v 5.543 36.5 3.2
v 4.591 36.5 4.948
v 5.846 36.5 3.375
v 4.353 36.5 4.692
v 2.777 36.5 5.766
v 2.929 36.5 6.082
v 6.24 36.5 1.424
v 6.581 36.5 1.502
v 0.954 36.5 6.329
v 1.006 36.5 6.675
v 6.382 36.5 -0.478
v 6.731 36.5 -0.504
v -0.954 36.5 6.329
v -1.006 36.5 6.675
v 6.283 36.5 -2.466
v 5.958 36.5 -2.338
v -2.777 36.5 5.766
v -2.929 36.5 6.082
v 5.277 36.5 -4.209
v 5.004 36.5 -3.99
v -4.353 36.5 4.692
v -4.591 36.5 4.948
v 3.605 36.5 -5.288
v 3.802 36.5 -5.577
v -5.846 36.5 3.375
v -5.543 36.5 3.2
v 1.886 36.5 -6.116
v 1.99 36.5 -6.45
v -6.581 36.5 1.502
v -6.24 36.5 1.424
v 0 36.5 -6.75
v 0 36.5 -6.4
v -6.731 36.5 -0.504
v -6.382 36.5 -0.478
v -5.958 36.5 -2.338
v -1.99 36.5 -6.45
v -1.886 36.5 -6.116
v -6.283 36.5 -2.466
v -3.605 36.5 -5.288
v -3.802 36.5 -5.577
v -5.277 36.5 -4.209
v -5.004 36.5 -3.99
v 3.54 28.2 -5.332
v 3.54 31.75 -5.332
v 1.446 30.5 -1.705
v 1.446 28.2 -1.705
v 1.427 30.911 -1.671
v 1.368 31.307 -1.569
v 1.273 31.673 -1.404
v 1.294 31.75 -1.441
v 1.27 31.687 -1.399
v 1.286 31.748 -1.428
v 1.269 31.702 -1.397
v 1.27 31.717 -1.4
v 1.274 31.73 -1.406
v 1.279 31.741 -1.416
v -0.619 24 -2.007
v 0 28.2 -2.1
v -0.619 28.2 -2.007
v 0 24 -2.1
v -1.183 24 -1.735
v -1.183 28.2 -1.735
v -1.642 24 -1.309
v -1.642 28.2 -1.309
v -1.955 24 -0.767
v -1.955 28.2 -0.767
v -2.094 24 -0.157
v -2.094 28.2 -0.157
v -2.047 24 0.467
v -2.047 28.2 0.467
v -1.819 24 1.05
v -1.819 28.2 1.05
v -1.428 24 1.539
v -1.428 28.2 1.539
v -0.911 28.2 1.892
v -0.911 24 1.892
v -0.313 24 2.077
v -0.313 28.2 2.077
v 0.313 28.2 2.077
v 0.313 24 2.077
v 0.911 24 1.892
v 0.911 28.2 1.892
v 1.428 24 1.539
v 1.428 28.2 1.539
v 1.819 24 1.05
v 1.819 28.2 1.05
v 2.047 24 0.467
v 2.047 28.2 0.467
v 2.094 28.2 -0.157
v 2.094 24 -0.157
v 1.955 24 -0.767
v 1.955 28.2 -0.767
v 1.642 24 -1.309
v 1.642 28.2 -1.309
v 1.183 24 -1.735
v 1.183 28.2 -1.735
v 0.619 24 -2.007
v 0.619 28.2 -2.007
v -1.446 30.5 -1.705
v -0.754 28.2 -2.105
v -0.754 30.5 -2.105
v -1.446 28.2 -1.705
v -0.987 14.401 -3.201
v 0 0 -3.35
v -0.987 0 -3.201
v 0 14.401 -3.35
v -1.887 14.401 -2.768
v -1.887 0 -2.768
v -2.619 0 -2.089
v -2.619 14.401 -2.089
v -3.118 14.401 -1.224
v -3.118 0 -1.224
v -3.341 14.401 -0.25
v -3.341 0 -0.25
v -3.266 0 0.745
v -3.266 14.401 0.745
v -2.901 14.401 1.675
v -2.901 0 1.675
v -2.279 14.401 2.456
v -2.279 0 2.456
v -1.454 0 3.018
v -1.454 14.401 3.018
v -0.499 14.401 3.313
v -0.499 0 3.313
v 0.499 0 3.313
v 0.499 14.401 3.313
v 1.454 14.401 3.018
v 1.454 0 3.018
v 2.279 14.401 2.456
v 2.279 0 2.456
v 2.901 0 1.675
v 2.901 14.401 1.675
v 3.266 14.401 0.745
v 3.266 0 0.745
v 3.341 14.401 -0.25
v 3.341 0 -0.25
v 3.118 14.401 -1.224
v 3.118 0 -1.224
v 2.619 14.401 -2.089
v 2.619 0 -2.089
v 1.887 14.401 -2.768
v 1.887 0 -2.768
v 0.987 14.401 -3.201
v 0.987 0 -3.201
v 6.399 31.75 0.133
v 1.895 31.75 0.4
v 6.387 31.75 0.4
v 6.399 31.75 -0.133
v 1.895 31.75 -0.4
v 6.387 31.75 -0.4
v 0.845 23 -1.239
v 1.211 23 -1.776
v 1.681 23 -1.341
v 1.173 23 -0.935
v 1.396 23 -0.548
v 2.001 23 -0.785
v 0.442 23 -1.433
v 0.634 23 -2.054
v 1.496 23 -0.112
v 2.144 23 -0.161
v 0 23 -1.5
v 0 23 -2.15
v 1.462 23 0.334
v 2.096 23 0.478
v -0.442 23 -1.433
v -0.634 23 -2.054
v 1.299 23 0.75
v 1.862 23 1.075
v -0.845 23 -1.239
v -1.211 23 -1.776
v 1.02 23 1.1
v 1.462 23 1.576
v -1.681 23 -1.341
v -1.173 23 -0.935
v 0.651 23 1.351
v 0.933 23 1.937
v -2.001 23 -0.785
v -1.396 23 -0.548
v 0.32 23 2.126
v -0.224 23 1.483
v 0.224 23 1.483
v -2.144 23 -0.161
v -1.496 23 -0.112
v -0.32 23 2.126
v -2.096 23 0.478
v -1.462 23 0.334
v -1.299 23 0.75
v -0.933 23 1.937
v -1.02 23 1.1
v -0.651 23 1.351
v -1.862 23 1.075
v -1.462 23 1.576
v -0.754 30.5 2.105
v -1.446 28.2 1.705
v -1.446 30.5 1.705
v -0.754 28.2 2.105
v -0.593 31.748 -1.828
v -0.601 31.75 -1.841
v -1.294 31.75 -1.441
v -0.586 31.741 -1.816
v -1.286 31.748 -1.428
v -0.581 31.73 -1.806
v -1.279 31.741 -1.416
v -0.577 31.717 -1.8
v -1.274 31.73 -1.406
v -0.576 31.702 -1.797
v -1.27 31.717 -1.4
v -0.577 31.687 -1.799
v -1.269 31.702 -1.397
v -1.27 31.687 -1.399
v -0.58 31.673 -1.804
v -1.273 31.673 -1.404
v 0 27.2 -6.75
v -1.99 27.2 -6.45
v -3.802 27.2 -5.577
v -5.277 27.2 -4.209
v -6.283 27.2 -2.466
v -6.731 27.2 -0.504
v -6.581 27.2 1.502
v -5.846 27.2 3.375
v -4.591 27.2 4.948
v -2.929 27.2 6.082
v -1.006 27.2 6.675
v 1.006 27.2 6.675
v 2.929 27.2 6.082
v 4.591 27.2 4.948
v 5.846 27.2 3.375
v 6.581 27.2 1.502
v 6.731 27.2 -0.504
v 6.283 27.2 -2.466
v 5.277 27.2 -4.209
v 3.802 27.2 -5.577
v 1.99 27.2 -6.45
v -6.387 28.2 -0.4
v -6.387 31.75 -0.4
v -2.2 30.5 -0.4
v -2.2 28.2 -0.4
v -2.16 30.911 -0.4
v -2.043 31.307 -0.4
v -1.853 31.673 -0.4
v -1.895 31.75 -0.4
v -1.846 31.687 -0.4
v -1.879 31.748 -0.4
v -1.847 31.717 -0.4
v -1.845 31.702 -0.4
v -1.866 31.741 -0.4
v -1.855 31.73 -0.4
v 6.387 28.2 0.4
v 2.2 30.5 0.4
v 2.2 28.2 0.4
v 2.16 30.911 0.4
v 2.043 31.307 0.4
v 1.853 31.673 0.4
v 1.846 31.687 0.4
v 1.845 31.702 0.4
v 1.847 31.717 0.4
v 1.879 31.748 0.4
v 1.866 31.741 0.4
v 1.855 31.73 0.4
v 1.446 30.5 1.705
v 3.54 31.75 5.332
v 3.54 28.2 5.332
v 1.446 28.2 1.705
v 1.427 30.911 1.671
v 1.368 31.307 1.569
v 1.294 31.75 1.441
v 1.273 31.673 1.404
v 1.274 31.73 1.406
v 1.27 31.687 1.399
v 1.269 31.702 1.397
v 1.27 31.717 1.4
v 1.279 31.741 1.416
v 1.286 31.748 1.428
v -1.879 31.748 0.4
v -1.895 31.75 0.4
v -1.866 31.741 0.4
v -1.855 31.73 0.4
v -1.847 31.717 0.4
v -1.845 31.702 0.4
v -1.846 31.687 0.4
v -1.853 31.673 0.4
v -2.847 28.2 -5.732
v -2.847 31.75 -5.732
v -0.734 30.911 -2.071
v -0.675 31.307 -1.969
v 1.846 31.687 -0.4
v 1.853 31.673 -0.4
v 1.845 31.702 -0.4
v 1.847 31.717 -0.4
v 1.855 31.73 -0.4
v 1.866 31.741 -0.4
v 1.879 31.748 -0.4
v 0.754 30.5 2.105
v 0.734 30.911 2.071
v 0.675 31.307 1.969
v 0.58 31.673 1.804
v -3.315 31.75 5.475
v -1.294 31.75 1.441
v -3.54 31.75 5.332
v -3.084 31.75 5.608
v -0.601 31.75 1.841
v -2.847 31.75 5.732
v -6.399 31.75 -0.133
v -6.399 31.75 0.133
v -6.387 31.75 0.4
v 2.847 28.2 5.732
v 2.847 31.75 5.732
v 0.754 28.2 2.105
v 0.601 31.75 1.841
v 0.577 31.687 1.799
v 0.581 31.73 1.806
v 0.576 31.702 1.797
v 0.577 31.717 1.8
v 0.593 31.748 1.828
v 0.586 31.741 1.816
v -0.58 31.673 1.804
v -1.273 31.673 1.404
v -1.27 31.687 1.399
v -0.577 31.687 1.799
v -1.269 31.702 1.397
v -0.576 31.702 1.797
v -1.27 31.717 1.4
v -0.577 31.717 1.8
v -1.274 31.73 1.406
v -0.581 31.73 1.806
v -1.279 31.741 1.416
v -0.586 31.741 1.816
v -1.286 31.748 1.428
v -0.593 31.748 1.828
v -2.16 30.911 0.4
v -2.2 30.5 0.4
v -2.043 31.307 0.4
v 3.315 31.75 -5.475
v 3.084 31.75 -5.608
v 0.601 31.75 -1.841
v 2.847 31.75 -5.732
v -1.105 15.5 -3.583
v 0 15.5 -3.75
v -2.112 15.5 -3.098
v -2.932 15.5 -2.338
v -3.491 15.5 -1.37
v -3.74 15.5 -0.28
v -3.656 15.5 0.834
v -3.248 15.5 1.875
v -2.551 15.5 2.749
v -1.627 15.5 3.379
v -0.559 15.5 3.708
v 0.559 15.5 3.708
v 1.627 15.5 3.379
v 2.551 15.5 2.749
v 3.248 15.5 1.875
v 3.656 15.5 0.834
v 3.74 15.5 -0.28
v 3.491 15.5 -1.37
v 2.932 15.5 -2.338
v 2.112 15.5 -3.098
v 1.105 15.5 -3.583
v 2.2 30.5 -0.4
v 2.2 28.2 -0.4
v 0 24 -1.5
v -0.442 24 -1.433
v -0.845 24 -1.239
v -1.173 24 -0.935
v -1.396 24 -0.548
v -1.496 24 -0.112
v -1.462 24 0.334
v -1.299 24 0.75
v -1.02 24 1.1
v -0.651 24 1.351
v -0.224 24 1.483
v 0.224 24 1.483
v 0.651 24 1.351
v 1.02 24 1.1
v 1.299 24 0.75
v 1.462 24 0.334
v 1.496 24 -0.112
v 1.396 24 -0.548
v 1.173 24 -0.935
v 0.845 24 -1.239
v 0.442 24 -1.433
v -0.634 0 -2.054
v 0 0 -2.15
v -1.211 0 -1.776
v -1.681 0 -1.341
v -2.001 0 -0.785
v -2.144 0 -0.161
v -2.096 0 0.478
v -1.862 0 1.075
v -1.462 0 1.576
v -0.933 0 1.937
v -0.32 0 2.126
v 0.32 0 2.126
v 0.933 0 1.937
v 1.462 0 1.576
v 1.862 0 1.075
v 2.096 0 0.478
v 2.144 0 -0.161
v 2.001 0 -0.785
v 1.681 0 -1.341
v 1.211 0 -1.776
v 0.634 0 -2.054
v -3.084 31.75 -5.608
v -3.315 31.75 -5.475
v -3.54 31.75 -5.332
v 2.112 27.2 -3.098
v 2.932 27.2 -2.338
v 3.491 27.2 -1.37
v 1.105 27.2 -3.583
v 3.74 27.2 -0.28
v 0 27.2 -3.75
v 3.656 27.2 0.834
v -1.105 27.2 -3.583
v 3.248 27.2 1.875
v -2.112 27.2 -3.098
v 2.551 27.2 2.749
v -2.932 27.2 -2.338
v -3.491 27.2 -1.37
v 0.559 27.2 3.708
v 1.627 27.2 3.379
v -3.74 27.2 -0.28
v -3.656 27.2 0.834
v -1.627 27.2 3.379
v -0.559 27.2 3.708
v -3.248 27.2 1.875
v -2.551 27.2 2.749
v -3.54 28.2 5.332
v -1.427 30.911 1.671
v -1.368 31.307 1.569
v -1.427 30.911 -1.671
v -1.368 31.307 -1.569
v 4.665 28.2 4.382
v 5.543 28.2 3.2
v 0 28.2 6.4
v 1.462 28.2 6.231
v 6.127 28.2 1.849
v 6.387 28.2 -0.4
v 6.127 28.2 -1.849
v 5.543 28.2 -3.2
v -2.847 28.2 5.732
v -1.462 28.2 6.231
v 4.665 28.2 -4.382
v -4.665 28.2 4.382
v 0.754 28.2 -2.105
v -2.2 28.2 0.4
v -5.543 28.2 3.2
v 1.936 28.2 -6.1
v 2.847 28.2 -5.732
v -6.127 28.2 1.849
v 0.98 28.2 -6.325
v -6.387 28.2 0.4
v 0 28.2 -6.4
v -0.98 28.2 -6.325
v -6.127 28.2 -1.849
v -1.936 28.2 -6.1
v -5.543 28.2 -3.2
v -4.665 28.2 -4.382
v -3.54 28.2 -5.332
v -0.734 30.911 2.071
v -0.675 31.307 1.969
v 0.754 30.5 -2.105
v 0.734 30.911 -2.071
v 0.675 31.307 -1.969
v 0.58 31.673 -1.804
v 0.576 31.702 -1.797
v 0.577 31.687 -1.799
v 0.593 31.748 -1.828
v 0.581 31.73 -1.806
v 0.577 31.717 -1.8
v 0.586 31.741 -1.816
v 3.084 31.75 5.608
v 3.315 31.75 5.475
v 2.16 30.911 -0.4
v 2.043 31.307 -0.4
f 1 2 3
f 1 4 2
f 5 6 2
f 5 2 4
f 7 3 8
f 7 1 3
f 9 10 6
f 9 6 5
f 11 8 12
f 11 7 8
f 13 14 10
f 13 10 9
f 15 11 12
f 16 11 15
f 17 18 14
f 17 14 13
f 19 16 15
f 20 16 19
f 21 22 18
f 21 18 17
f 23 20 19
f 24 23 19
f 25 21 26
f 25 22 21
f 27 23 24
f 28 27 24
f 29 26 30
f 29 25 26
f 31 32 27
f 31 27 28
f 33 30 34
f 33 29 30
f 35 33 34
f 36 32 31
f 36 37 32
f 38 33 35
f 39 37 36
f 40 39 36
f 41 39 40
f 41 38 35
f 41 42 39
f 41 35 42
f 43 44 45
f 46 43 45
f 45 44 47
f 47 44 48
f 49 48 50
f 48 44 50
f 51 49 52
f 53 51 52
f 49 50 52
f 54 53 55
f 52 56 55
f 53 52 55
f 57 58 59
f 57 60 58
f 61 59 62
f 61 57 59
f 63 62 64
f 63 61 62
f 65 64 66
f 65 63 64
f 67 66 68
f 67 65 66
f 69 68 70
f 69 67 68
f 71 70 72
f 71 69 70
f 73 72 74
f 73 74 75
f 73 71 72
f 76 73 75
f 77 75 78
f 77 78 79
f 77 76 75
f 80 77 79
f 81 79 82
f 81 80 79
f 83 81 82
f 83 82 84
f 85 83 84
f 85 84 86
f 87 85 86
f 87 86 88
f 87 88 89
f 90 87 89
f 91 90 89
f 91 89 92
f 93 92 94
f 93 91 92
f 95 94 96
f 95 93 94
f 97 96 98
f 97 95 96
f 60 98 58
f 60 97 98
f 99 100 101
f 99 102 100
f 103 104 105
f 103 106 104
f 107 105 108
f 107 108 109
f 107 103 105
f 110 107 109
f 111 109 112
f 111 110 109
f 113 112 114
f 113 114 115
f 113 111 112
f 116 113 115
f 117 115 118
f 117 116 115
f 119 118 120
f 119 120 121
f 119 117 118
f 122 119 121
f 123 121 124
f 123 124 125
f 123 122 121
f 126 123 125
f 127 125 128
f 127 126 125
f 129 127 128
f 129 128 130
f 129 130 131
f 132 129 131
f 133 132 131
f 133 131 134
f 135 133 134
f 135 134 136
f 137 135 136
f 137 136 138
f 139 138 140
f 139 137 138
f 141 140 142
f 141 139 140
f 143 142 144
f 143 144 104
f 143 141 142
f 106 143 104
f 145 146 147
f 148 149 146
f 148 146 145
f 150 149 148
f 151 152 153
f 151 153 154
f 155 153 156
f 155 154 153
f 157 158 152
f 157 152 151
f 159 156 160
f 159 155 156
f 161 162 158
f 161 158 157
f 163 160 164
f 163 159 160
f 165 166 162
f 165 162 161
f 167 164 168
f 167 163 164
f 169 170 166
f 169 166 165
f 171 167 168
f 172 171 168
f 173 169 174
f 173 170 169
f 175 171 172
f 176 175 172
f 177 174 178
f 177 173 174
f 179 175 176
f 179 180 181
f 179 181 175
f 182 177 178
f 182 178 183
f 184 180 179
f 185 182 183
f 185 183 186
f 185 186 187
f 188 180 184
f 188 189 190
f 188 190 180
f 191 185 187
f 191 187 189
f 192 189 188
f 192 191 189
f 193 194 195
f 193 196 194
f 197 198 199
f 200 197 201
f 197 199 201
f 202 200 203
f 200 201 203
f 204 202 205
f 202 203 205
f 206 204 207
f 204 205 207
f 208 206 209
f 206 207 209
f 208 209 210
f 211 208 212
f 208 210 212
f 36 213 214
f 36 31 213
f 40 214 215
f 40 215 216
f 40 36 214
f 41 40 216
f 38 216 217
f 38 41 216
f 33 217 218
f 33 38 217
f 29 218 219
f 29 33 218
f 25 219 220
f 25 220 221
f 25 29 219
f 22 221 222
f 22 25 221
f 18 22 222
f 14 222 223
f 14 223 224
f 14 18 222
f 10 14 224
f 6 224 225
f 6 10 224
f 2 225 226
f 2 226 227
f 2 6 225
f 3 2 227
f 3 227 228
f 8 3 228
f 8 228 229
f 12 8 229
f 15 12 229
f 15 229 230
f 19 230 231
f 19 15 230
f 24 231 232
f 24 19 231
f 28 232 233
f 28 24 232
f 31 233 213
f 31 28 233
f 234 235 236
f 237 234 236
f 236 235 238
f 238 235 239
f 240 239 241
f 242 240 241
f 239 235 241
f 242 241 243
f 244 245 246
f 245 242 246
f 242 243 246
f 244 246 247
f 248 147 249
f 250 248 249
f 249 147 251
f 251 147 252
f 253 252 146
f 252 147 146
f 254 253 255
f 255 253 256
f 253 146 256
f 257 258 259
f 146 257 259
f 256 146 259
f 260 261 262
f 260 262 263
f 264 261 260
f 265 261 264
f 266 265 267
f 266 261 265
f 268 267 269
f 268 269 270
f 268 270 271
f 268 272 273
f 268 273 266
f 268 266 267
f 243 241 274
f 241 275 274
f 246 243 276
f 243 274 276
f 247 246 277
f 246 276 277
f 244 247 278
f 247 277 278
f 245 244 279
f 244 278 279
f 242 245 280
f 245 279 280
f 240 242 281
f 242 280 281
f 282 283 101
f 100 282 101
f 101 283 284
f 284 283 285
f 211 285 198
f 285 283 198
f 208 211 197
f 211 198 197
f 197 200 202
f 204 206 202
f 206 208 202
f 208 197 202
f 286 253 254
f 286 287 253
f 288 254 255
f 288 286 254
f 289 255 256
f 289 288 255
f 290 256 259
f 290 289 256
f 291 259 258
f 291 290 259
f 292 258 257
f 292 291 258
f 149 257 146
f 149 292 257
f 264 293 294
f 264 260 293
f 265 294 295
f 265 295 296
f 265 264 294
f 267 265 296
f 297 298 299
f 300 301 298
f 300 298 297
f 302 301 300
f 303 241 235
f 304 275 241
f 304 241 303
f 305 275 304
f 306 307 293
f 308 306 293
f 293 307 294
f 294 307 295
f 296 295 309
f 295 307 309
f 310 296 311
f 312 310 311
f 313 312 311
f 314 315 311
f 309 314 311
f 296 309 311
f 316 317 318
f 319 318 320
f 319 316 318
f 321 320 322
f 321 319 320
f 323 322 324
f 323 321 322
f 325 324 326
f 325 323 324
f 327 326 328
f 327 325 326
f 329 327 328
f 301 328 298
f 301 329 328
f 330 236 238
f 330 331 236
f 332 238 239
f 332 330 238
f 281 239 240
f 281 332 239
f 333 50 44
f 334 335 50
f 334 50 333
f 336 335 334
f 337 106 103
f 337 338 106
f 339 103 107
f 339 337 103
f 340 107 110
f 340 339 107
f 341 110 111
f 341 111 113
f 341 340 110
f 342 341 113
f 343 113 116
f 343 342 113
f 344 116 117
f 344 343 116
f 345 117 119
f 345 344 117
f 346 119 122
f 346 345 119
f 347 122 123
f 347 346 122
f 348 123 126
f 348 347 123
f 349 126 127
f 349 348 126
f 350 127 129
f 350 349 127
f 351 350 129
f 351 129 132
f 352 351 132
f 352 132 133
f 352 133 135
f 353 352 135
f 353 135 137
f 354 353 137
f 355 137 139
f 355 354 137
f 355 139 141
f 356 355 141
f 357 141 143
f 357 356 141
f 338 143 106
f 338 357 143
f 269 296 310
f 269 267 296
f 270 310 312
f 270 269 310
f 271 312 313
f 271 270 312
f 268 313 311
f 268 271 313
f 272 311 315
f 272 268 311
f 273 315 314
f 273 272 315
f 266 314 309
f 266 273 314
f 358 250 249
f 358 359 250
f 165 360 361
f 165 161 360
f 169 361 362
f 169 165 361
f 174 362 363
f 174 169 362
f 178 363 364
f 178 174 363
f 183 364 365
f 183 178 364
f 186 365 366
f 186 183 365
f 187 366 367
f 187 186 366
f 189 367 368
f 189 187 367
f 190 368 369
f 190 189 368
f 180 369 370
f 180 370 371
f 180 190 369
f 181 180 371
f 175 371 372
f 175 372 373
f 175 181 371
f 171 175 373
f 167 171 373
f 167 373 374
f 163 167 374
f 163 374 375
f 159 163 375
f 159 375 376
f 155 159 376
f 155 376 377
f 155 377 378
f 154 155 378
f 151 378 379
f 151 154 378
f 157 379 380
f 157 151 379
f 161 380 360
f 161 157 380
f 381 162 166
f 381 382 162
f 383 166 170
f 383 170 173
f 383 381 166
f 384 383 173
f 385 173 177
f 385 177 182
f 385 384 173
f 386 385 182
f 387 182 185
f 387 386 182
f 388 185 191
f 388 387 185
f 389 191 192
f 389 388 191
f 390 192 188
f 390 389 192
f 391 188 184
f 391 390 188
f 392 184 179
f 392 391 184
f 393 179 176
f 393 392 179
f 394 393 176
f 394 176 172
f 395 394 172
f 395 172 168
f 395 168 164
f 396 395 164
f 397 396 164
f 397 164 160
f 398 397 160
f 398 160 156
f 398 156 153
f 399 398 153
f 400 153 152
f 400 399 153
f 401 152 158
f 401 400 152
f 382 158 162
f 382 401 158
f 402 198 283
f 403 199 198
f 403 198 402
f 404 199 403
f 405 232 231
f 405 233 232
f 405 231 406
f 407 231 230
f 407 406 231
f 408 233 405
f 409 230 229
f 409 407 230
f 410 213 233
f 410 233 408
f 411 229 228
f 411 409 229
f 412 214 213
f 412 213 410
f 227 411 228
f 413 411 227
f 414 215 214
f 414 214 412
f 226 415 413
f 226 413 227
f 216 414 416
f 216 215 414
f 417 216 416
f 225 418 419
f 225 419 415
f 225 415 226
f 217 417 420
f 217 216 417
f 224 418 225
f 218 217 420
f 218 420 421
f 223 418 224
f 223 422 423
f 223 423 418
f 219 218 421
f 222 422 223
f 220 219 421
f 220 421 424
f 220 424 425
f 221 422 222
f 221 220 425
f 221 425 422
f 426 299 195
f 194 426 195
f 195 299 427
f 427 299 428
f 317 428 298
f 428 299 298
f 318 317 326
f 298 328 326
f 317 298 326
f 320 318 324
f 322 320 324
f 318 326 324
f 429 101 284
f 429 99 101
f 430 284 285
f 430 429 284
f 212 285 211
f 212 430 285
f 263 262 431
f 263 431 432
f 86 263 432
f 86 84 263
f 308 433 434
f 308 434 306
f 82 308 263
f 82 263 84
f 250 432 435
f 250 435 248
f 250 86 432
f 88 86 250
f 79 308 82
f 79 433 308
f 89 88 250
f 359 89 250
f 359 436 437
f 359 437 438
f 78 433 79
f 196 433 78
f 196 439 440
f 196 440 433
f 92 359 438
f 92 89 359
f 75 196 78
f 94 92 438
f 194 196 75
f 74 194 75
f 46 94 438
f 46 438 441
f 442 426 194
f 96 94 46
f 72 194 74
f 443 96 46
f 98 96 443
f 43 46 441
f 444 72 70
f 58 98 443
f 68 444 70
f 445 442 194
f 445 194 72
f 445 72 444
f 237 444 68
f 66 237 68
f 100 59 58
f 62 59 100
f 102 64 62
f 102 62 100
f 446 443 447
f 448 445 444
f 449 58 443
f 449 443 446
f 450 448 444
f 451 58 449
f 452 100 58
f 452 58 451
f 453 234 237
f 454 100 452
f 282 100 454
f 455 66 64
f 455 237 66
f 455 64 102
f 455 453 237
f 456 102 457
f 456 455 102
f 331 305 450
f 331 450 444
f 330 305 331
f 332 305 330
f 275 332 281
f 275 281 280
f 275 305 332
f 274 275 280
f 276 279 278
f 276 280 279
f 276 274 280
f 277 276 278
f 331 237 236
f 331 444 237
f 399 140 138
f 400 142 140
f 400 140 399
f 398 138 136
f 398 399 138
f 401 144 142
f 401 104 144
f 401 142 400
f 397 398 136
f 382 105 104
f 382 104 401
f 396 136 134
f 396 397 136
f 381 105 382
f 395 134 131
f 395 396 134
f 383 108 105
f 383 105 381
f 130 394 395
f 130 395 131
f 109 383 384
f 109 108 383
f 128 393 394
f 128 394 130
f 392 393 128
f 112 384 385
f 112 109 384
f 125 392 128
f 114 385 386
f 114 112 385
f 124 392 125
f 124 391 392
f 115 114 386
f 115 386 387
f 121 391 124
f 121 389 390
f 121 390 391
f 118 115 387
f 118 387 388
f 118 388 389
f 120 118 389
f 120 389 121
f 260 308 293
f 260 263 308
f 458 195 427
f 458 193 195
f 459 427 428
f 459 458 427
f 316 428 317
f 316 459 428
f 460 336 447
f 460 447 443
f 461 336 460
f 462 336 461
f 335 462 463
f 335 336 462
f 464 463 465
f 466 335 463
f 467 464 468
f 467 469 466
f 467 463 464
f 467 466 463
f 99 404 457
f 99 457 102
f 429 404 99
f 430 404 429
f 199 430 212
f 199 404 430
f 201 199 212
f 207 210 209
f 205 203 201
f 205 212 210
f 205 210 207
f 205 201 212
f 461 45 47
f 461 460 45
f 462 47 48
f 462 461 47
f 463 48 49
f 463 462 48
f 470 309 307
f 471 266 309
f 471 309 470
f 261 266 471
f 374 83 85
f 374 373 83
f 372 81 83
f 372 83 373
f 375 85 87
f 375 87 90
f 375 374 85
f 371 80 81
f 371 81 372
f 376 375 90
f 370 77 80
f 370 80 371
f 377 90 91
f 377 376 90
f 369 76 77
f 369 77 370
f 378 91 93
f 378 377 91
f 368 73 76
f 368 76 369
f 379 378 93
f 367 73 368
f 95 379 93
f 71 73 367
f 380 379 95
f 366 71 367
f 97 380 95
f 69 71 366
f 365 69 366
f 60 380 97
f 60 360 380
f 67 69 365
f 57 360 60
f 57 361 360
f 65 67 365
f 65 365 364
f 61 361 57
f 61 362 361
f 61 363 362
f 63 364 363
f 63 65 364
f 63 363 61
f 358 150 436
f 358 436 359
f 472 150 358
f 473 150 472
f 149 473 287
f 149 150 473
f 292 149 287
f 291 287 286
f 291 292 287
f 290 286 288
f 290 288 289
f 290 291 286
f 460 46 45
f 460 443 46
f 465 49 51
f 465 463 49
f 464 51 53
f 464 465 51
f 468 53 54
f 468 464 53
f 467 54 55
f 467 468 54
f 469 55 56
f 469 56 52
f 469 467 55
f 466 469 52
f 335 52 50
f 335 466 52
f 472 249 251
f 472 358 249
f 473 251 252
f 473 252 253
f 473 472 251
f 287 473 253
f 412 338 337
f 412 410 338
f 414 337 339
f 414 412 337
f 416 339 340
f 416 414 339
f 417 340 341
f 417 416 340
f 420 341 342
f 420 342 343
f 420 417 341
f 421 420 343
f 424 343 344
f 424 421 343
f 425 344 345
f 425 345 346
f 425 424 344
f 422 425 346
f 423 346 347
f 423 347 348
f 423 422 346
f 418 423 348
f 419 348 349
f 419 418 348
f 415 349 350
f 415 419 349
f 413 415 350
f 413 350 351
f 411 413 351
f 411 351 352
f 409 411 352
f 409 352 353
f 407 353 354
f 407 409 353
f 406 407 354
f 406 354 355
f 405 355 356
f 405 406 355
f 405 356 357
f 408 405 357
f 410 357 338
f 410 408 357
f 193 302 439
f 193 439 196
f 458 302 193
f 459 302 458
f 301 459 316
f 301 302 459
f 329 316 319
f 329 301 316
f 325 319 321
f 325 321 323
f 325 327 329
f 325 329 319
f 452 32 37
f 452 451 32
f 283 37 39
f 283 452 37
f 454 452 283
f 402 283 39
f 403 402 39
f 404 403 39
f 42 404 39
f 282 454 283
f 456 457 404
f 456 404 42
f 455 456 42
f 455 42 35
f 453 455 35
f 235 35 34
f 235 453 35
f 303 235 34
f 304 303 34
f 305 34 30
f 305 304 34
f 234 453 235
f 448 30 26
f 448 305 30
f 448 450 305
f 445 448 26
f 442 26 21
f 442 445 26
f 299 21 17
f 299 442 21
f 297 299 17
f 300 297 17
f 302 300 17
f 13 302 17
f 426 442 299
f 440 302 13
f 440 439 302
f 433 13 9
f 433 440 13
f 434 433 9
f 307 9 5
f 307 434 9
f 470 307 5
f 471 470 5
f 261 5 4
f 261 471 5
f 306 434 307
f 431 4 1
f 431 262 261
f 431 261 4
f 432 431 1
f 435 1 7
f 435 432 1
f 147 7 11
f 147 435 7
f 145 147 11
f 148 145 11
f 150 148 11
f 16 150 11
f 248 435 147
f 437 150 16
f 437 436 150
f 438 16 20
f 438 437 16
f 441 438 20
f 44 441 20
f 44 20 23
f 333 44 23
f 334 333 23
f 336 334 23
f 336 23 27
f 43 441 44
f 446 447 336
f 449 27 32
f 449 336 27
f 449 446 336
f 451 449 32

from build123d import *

# Parameters (mm, degrees)
BOSS_EXTRUDE1_DEPTH      = 0.4
FILLET1_R                = 0.05
CIRPATTERN1_COUNT        = 6
FILLET1_OF_CIRPATTERN1_R = 0.05


with BuildPart() as part:
    # Sketch1 → Revolve1 (revolve)
    with BuildSketch(Plane.XY):
        Polygon((-6.4, 36.5), (-6.4, 28.2), (-2.1, 28.2), (-2.1, 24), (-1.5, 24), (-1.5, 23), (-2.15, 23), (-2.15, 0), (-3.35, 0), (-3.35, 14.401009032), (-3.75, 15.5), (-3.75, 27.2), (-6.75, 27.2), (-6.75, 36.5), align=None)
    revolve(axis=Axis((0, 0, 0), (0, 1, 0)))

    # Sketch3 → Boss-Extrude1 (add, symmetric)
    with BuildSketch(Plane.XY):
        with BuildLine():
            Line((-6.4, 31.75), (-6.4, 28.2))
            Line((-6.4, 28.2), (-2.2, 28.2))
            Line((-2.2, 28.2), (-2.2, 30.5))
            ThreePointArc((-2.2, 30.5), (-2.097563242, 31.156220237), (-1.8, 31.75))
            Line((-1.8, 31.75), (-6.4, 31.75))
        make_face()
    boss_extrude1 = extrude(amount=BOSS_EXTRUDE1_DEPTH, both=True)

    # Fillet1
    fillet1_edges = [part.edges().sort_by_distance(p)[0] for p in [
        (-1.8, 31.75, 0),
    ]]
    fillet(fillet1_edges, radius=FILLET1_R)

    # CirPattern1: Boss-Extrude1 ×6 about axis
    cirpattern1_axis = Axis((0, 0, 0), (0, 1, 0))
    for i in range(1, CIRPATTERN1_COUNT):
        add(boss_extrude1.rotate(cirpattern1_axis, i * 360 / CIRPATTERN1_COUNT))

    # Fillet1 of CirPattern1
    fillet1_of_cirpattern1_edges = [part.edges().sort_by_distance(p)[0] for p in [
        (-0.9, 31.75, 1.558845727),
        (0.9, 31.75, 1.558845727),
        (1.8, 31.75, 0),
        (0.9, 31.75, -1.558845727),
        (-0.9, 31.75, -1.558845727),
    ]]
    fillet(fillet1_of_cirpattern1_edges, radius=FILLET1_OF_CIRPATTERN1_R)


solid = part.part
